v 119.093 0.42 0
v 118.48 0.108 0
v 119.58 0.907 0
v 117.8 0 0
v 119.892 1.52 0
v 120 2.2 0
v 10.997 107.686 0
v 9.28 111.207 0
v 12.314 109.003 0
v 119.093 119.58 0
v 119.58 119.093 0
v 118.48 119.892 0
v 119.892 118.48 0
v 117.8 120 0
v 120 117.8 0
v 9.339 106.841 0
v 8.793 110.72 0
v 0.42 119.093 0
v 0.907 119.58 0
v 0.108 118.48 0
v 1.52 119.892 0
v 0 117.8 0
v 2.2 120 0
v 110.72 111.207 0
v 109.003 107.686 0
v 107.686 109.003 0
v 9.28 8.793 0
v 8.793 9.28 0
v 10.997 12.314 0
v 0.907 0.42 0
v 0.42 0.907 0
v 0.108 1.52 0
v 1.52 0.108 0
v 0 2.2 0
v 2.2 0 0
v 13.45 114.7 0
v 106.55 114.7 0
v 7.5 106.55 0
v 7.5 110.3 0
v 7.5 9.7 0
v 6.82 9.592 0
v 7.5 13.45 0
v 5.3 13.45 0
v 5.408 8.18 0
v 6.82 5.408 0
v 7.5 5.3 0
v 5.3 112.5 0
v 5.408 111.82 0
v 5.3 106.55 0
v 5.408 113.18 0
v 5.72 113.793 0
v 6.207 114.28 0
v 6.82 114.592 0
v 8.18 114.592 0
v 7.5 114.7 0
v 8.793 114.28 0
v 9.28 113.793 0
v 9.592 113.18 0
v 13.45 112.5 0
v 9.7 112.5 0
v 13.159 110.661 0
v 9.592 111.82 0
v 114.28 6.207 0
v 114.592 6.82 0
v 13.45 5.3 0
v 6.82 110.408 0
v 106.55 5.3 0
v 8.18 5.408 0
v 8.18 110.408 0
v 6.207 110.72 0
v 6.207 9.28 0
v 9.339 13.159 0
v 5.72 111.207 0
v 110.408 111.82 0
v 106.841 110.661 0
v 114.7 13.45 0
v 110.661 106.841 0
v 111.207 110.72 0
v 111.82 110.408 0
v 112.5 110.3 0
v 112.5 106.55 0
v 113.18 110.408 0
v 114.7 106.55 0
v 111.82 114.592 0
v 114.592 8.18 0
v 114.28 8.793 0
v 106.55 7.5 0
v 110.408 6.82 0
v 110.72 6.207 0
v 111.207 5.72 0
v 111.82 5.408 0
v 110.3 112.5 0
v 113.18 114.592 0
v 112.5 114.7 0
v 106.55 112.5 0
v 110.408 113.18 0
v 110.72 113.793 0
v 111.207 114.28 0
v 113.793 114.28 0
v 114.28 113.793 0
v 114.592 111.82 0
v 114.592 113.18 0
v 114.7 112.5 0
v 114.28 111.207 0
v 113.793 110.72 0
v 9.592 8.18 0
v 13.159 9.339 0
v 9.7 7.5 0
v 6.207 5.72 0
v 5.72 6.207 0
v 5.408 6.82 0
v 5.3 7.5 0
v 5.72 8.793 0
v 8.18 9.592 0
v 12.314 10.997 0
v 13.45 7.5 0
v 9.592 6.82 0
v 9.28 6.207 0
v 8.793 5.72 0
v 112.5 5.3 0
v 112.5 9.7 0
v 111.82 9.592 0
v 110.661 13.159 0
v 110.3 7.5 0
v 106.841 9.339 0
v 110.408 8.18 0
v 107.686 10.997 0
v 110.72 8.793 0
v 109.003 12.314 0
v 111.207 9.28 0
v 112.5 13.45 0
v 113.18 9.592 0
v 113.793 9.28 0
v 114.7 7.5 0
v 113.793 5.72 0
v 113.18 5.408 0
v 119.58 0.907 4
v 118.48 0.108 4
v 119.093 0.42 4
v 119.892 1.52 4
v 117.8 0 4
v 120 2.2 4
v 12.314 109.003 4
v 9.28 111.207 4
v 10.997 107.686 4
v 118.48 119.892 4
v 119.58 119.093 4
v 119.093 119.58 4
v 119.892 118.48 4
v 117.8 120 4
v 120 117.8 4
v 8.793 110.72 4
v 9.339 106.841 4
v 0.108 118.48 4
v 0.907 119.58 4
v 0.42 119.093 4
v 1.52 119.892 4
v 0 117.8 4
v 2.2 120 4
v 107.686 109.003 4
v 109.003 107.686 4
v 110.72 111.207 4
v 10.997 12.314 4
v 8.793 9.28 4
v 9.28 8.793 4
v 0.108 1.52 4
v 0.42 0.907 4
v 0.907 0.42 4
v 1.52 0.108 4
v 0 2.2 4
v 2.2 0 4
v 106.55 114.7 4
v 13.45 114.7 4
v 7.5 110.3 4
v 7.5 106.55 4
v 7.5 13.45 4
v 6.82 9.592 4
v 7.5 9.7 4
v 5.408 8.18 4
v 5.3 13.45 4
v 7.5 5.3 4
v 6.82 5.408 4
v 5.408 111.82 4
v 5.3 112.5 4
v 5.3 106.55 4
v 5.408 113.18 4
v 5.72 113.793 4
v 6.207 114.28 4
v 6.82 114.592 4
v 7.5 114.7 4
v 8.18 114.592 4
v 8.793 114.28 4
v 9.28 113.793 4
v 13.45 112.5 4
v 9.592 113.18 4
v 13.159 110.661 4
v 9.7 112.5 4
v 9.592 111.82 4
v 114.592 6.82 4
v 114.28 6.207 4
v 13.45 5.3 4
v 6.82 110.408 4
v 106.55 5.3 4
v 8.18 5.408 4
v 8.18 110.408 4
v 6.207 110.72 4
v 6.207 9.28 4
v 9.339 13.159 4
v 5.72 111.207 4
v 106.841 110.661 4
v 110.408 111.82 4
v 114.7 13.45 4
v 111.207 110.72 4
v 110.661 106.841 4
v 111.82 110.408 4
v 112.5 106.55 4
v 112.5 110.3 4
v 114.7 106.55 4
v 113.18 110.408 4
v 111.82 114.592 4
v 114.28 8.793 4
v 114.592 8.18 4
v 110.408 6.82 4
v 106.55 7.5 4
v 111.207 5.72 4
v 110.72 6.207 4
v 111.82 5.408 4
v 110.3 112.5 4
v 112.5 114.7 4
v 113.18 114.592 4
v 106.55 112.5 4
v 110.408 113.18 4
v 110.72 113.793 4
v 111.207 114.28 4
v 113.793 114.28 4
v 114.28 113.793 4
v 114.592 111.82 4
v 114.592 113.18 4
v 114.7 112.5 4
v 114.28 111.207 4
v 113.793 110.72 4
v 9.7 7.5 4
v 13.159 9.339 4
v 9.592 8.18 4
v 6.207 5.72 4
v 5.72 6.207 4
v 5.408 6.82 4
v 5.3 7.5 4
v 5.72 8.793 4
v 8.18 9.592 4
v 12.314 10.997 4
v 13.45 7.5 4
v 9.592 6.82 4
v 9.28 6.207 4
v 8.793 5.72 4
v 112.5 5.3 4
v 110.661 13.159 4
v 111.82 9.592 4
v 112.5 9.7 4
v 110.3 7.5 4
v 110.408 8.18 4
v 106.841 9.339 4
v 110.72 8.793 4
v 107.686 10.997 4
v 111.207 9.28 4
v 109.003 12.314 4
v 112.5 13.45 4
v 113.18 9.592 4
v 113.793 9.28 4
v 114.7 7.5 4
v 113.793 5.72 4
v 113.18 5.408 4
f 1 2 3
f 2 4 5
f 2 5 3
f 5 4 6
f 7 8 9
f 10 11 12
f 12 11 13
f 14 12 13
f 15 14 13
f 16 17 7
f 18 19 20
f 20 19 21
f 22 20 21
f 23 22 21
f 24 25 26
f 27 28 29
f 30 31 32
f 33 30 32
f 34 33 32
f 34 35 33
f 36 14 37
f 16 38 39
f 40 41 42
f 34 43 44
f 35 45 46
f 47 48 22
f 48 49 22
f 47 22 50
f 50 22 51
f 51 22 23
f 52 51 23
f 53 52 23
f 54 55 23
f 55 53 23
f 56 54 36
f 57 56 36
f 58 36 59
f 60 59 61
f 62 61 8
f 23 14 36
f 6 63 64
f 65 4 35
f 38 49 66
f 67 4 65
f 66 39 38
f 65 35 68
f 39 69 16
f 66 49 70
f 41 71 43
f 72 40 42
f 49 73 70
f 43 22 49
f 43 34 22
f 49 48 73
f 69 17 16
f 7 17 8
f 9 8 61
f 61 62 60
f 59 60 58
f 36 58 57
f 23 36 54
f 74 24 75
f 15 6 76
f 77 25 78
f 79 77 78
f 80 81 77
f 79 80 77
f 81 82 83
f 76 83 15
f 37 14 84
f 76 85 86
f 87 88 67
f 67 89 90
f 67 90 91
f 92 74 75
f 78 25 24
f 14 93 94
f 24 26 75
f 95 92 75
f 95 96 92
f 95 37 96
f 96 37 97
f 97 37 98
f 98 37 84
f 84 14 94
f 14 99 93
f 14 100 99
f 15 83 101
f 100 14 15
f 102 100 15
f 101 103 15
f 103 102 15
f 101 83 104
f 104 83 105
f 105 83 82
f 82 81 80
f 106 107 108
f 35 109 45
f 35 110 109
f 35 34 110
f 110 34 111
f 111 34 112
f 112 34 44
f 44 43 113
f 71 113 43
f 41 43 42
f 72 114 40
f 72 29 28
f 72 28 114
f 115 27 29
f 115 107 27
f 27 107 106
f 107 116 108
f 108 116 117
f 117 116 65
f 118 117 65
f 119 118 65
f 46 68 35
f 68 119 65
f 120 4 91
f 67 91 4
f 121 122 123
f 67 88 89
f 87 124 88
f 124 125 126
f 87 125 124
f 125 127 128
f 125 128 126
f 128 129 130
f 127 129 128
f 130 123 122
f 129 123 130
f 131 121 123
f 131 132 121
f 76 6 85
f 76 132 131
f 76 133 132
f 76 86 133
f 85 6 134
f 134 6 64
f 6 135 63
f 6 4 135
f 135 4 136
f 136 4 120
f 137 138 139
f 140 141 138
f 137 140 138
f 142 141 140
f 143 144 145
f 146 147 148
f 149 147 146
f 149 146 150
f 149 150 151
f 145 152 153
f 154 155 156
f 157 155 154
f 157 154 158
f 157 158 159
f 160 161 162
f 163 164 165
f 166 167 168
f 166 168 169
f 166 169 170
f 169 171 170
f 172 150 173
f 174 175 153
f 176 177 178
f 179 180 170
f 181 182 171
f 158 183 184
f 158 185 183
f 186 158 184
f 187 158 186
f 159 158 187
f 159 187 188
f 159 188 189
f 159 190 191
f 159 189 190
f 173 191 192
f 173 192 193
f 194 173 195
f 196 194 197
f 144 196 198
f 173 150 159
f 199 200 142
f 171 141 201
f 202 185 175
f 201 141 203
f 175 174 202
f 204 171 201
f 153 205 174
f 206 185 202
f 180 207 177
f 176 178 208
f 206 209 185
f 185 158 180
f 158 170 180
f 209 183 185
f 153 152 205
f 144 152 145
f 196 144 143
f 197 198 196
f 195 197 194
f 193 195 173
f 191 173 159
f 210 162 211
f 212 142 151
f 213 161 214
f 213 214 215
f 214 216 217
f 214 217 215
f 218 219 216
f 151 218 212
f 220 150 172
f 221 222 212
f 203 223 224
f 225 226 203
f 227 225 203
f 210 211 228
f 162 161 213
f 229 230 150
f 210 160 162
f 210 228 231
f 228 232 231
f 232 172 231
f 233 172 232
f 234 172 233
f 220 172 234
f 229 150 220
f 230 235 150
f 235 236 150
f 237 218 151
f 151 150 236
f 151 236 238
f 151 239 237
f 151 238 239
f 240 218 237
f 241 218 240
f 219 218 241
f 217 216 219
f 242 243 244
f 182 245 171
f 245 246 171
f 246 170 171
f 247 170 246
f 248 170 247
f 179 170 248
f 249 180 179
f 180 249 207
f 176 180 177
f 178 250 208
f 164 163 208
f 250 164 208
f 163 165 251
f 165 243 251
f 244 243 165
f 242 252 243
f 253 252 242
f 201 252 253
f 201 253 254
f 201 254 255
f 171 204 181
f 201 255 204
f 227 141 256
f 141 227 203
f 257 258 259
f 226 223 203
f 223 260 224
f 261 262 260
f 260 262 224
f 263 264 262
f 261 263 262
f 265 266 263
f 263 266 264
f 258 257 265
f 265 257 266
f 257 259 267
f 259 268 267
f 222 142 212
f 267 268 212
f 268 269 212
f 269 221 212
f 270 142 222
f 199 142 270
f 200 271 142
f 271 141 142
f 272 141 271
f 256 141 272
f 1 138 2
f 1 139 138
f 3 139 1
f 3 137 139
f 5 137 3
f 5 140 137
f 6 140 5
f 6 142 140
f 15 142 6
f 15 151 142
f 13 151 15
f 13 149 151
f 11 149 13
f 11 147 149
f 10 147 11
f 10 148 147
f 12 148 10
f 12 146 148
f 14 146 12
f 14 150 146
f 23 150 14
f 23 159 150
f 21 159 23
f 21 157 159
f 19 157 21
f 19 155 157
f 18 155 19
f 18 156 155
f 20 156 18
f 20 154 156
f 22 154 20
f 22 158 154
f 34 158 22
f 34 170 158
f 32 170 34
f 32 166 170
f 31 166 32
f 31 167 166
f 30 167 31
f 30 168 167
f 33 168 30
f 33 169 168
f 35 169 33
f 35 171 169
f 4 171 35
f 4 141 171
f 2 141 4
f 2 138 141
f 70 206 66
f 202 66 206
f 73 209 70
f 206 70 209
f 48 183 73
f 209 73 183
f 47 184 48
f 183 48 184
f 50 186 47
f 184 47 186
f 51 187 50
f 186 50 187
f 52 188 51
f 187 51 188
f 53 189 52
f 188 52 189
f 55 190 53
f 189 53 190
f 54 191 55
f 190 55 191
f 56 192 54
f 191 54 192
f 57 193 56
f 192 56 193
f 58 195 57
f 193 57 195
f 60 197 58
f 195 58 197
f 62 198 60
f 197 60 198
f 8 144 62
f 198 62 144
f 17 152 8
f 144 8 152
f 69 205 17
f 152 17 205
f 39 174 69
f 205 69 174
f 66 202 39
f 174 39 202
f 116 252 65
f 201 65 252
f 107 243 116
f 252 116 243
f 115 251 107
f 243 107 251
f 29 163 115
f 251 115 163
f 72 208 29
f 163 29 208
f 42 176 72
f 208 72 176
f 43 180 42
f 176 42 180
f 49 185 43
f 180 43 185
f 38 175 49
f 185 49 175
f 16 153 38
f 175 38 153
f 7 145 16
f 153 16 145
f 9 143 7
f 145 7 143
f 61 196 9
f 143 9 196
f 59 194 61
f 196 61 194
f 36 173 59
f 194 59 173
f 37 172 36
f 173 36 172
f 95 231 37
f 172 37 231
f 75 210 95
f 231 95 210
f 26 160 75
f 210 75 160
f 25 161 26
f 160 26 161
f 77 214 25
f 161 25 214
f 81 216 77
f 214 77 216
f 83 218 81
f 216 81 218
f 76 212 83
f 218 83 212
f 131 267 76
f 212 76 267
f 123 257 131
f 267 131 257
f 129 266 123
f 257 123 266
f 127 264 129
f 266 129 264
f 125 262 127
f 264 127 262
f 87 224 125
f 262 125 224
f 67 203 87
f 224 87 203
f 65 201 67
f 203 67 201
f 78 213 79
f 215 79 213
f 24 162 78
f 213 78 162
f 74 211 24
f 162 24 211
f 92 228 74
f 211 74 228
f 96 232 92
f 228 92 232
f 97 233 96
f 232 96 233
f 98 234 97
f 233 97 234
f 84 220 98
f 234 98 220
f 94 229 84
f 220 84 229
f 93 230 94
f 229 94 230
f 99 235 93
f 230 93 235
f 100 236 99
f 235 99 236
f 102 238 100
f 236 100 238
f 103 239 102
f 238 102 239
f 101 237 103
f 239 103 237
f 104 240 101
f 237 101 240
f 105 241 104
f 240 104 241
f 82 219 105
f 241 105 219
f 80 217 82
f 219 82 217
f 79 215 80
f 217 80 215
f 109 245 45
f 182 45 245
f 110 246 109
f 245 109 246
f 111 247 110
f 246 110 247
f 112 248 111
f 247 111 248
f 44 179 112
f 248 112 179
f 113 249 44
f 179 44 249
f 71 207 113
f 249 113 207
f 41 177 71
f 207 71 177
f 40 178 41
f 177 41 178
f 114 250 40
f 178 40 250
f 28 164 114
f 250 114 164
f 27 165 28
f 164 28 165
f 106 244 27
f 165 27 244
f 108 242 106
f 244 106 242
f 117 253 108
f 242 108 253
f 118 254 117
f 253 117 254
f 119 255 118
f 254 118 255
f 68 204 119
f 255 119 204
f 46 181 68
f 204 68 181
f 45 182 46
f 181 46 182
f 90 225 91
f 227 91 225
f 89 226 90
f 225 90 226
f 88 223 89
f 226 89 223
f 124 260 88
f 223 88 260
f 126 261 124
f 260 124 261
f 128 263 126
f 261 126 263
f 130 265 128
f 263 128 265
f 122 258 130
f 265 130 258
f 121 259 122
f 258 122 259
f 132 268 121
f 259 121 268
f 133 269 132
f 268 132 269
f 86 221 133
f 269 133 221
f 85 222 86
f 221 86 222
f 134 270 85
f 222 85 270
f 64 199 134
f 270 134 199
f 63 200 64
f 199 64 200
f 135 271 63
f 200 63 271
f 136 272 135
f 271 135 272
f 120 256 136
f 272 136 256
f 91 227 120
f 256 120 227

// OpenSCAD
/*
OPENSCAD Library file by the DoomMeister
Mounting surround for small DC fans (25 - 120mm)

Data taken from various places around the internet.
http://www.qwikflow.com/dc_fans.html

//Released under the terms of the GNU GPL v3.0
This program is free software: you can redistribute it and/or modify
it under the terms of the GNU General Public License as published by
the Free Software Foundation, either version 3 of the License, or
(at your option) any later version.

This program is distributed in the hope that it will be useful,
but WITHOUT ANY WARRANTY; without even the implied warranty of
MERCHANTABILITY or FITNESS FOR A PARTICULAR PURPOSE. See the
GNU General Public License for more details.

You should have received a copy of the GNU General Public License
along with this program. If not, see <http://www.gnu.org/licenses/>.
*/

//uncomment this for example
//fan_mount(size=60,thick=3);

module fan_mount(size=40,thick = 4)
{
if(size == 25)
	{
	_fan_mount(
			fan_size = 25,
			fan_mounting_pitch = 20,
			fan_m_hole_dia = 3,
			holder_thickness = thick
		 );
	}
if(size == 30)
	{
	_fan_mount(
			fan_size = 30,
			fan_mounting_pitch = 24,
			fan_m_hole_dia = 3,
			holder_thickness = thick
		 );
	}

if(size == 40)
	{
	_fan_mount(
			fan_size = 40,
			fan_mounting_pitch = 32,
			fan_m_hole_dia = 3.5,
			holder_thickness = thick
		 );
	}
if(size == 45)
	{
	_fan_mount(
			fan_size = 45,
			fan_mounting_pitch = 37,
			fan_m_hole_dia = 4.3,
			holder_thickness = thick
		 );
	}
if(size == 60)
	{
	_fan_mount(
			fan_size = 60,
			fan_mounting_pitch = 50,
			fan_m_hole_dia = 4.4,
			holder_thickness = thick
		 );
	}
if(size == 80)
	{
	_fan_mount(
			fan_size = 80,
			fan_mounting_pitch = 71.5,
			fan_m_hole_dia = 4.4,
			holder_thickness = thick
		 );
	}

if(size == 120)
	{
	_fan_mount(
			fan_size = 120,
			fan_mounting_pitch = 105,
			fan_m_hole_dia = 4.4,
			holder_thickness = thick
		 );
	}
}


//inner module
module _fan_mount(
			fan_size, //nominsl size of fan
			fan_mounting_pitch, //pitch between mounting holes
			fan_m_hole_dia, //mounting hole diameter
			holder_thickness //user defined thickness
		 )
{

offset1 = (fan_size-(fan_mounting_pitch + fan_m_hole_dia))/2;
offset2 = (fan_size-(fan_mounting_pitch))/2;
offset3 = offset2 + fan_mounting_pitch;
thickness = (fan_size-fan_mounting_pitch)/2;	
			
			//difference()
			//{
			linear_extrude(height = holder_thickness)
			union()
			{	
			difference()
			{
				translate([fan_m_hole_dia/2,fan_m_hole_dia/2,0])
				minkowski()
				{	
					square([fan_size - fan_m_hole_dia,fan_size - fan_m_hole_dia]);
					circle(r= fan_m_hole_dia/2, $fn=20);
				}
			
					translate([offset1,offset1,0])
					square([fan_mounting_pitch + fan_m_hole_dia,fan_mounting_pitch + fan_m_hole_dia]);
				}
				translate([offset2,offset2,0])
				rotate([0,0,0])_corner_hole();
				translate([offset3,offset2,0])
				rotate([0,0,90])_corner_hole();
				translate([offset2,offset3,0])
				rotate([0,0,90])_corner_hole();
				translate([offset3,offset3,0])
				rotate([0,0,0])_corner_hole();
			}

module _corner_hole()
{
				difference(){
					union(){
							difference(){
							square([fan_m_hole_dia + thickness,fan_m_hole_dia + thickness],center=true);
							square([(fan_m_hole_dia + thickness)/2,(fan_m_hole_dia + thickness)/2],center=false);
							translate([-(fan_m_hole_dia + thickness)/2,-(fan_m_hole_dia + thickness)/2])
							square([(fan_m_hole_dia + thickness)/2,(fan_m_hole_dia + thickness)/2],center=false);
							}
					circle(r=(fan_m_hole_dia + thickness)/2, $fn=20);
					}
					circle(r=(fan_m_hole_dia)/2, $fn=20);
				}
}


echo(offset1,offset2,thickness);
}

fan_mount(120);
